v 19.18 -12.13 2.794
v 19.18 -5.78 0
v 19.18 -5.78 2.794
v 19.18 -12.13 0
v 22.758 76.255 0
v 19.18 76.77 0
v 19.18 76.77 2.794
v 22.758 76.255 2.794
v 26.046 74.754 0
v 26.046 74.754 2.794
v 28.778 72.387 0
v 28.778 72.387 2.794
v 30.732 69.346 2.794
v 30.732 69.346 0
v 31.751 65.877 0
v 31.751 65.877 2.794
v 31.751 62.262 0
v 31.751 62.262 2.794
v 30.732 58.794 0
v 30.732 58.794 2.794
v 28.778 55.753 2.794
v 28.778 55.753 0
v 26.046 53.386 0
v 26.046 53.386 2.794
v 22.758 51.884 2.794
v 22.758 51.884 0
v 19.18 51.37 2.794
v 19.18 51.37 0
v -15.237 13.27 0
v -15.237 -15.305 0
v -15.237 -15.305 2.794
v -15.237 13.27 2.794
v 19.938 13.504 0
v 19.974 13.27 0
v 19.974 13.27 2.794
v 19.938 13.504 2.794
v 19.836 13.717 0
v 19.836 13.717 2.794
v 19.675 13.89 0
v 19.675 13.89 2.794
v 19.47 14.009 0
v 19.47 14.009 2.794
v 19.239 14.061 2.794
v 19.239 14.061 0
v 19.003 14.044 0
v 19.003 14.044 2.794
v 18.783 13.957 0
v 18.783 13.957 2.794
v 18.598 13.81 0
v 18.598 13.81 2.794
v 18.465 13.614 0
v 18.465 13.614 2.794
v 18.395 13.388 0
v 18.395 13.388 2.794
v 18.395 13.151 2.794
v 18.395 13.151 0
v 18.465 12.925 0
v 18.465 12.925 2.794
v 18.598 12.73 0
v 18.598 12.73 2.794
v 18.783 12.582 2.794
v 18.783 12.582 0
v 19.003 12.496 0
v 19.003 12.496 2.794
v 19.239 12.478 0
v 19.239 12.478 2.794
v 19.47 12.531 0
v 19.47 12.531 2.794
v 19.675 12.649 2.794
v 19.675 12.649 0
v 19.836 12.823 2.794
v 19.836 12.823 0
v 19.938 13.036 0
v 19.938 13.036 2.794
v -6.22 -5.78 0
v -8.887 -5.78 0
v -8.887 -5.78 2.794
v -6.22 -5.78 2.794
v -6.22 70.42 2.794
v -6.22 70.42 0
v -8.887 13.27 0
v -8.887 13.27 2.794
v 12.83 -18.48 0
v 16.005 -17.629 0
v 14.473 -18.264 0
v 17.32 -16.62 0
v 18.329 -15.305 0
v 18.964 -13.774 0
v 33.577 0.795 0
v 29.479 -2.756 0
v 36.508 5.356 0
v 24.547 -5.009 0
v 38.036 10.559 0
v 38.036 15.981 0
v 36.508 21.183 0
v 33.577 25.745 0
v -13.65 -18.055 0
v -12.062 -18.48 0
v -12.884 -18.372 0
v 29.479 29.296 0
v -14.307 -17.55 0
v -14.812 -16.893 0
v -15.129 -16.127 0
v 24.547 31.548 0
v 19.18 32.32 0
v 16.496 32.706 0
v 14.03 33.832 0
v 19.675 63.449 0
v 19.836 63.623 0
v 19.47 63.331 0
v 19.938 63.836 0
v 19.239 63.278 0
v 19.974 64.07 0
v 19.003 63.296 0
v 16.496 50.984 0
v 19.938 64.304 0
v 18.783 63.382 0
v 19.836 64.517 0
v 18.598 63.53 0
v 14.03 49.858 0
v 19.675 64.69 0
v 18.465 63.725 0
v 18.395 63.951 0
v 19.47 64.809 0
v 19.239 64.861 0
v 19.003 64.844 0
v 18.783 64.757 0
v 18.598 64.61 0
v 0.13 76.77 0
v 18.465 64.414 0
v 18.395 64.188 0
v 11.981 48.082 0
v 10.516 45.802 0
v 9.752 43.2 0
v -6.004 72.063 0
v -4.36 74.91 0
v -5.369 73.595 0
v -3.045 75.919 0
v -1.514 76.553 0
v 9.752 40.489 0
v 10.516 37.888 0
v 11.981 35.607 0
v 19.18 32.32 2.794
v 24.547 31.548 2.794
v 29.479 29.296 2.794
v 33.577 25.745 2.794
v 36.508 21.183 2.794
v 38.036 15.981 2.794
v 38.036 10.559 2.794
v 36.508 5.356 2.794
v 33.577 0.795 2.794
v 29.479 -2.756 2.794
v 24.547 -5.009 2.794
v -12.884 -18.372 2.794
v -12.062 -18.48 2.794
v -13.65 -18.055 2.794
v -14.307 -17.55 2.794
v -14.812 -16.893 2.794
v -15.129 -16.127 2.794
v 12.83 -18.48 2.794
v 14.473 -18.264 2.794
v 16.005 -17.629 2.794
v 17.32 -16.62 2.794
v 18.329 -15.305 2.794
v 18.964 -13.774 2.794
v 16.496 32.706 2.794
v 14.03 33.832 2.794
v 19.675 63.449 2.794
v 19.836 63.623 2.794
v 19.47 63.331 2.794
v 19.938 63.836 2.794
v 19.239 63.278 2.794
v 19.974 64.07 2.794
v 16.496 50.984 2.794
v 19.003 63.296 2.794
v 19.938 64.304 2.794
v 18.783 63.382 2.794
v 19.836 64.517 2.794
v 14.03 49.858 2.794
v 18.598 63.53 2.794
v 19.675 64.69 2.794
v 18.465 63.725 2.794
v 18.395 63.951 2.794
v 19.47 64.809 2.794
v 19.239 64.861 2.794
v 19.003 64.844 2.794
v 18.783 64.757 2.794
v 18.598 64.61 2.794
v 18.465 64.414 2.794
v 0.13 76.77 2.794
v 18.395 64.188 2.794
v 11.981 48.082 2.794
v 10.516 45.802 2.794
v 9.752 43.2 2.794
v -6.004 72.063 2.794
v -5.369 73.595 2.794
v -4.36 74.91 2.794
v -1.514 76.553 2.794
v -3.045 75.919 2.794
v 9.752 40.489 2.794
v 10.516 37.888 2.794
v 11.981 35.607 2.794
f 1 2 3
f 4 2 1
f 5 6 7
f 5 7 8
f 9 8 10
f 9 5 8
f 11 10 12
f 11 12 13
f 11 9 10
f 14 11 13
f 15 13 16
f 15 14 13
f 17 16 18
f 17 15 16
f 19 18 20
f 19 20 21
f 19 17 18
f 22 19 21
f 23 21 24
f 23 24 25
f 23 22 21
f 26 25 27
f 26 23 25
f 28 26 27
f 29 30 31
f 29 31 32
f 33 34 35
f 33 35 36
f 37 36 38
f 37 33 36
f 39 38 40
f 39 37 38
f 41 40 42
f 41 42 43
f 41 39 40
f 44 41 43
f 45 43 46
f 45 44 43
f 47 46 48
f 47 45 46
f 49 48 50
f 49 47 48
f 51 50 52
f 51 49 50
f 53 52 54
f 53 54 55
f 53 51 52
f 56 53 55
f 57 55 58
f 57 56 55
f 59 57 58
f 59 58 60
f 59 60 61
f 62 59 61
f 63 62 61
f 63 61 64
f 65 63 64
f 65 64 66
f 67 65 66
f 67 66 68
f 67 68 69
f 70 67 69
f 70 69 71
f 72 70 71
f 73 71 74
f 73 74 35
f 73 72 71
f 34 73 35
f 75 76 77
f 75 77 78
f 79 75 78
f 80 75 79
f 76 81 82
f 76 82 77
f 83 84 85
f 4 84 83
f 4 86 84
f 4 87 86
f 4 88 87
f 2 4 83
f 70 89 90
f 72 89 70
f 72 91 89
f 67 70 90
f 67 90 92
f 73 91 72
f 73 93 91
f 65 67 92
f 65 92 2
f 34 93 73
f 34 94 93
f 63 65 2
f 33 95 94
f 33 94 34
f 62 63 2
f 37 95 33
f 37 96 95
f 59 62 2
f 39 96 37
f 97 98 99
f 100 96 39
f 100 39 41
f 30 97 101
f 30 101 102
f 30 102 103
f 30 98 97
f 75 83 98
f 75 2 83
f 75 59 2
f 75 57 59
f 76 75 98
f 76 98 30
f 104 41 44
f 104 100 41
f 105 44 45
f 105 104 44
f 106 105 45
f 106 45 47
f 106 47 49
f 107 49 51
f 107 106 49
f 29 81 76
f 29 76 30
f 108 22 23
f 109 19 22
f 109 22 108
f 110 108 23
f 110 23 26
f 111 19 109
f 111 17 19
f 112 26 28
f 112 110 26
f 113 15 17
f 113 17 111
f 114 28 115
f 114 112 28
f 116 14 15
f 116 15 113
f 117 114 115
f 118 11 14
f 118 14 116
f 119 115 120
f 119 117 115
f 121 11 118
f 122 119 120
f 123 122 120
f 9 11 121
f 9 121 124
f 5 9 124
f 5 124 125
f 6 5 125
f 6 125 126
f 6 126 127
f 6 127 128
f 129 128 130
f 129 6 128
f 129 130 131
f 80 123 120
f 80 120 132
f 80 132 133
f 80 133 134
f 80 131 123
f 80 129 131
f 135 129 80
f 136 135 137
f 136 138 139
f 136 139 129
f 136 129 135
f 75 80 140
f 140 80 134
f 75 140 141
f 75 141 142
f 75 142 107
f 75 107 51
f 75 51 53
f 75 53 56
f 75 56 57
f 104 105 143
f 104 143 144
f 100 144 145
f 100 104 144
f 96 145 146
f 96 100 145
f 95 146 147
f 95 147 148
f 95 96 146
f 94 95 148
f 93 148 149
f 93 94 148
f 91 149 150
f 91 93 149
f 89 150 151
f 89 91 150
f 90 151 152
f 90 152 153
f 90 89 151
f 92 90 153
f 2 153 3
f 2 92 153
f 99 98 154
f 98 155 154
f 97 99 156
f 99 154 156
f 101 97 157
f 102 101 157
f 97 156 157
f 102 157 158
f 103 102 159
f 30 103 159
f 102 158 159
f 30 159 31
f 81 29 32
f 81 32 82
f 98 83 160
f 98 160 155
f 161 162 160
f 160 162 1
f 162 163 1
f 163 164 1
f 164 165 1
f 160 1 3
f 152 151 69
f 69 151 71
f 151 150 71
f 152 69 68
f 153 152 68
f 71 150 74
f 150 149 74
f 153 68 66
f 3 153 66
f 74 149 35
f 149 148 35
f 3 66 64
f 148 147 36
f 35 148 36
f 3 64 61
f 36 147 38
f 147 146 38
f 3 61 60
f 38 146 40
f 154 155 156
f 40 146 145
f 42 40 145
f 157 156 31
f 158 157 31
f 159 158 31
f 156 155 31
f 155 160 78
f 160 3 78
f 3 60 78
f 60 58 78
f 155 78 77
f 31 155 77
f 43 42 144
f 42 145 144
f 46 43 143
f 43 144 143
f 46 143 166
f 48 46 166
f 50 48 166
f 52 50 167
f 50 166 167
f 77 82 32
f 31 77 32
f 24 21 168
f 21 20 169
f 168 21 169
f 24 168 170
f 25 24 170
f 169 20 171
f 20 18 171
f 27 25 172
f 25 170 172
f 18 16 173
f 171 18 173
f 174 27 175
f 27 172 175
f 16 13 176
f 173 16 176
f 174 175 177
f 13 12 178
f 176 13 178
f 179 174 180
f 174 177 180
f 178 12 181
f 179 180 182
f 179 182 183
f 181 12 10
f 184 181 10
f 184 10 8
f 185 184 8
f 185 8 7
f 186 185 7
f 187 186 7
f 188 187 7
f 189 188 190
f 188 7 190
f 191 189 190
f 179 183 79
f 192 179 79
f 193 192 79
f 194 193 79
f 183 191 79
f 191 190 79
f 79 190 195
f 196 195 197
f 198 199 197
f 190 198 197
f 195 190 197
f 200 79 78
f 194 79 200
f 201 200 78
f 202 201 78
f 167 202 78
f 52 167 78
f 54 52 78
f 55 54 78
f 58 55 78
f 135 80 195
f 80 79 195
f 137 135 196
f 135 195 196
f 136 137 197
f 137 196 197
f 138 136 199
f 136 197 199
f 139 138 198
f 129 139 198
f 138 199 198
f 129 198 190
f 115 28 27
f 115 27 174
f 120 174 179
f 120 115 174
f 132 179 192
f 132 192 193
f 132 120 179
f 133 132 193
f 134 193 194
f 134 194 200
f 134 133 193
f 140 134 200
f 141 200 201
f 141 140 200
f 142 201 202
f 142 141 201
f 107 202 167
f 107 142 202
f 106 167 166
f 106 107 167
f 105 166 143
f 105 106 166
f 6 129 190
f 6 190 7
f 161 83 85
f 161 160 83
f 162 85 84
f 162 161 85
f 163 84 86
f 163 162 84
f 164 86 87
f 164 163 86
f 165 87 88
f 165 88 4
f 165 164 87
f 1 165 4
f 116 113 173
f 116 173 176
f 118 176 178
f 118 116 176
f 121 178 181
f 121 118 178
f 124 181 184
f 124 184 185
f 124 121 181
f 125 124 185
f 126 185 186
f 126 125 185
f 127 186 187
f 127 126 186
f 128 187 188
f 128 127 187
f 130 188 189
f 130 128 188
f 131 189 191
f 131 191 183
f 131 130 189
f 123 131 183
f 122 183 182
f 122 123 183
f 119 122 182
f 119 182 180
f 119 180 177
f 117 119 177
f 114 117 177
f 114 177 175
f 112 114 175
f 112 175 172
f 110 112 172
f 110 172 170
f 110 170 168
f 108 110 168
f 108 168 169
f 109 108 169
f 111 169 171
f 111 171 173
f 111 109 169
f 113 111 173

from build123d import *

# Parameters (mm, degrees)
SKETCH1_R           = 0.79375
BOSS_EXTRUDE1_DEPTH = 2.794
FILLET1_R           = 6.35
FILLET2_R           = 3.175


with BuildPart() as part:
    # Sketch1 → Boss-Extrude1 (new body)
    with BuildSketch(Plane.XY):
        with BuildLine():
            Line((-15.237072382, 13.269795383), (-8.887072382, 13.269795383))
            Line((-8.887072382, 13.269795383), (-8.887072382, -5.780204617))
            Line((-8.887072382, -5.780204617), (-6.220072382, -5.780204617))
            Line((-6.220072382, -5.780204617), (-6.220072382, 32.313013632))
            Line((-6.220072382, 32.313013632), (-6.220072382, 76.769795383))
            Line((-6.220072382, 76.769795383), (19.179927297, 76.769795383))
            ThreePointArc((19.179927297, 76.769795383), (31.879927297, 64.069795092), (19.179926715, 51.369795383))
            ThreePointArc((19.179926715, 51.369795383), (9.654926277, 41.844795383), (19.179926715, 32.319795383))
            ThreePointArc((19.179926715, 32.319795383), (38.229927618, 13.269795835), (19.179927618, -5.780204617))
            Line((19.179927618, -5.780204617), (19.179927618, -18.480204617))
            Line((19.179927618, -18.480204617), (-15.237072382, -18.480204617))
            Line((-15.237072382, -18.480204617), (-15.237072382, 13.269795383))
        make_face()
        with Locations((19.179927618, 13.269795383)):
            Circle(SKETCH1_R, mode=Mode.SUBTRACT)
        with Locations((19.179927618, 64.069795383)):
            Circle(SKETCH1_R, mode=Mode.SUBTRACT)
    extrude(amount=BOSS_EXTRUDE1_DEPTH)

    # Fillet1
    fillet1_edges = [part.edges().sort_by_distance(p)[0] for p in [
        (19.179927618, -18.480204617, 1.397),
        (-6.220072382, 76.769795383, 1.397),
    ]]
    fillet(fillet1_edges, radius=FILLET1_R)

    # Fillet2
    fillet2_edges = [part.edges().sort_by_distance(p)[0] for p in [
        (-15.237072382, -18.480204617, 1.397),
    ]]
    fillet(fillet2_edges, radius=FILLET2_R)


solid = part.part
